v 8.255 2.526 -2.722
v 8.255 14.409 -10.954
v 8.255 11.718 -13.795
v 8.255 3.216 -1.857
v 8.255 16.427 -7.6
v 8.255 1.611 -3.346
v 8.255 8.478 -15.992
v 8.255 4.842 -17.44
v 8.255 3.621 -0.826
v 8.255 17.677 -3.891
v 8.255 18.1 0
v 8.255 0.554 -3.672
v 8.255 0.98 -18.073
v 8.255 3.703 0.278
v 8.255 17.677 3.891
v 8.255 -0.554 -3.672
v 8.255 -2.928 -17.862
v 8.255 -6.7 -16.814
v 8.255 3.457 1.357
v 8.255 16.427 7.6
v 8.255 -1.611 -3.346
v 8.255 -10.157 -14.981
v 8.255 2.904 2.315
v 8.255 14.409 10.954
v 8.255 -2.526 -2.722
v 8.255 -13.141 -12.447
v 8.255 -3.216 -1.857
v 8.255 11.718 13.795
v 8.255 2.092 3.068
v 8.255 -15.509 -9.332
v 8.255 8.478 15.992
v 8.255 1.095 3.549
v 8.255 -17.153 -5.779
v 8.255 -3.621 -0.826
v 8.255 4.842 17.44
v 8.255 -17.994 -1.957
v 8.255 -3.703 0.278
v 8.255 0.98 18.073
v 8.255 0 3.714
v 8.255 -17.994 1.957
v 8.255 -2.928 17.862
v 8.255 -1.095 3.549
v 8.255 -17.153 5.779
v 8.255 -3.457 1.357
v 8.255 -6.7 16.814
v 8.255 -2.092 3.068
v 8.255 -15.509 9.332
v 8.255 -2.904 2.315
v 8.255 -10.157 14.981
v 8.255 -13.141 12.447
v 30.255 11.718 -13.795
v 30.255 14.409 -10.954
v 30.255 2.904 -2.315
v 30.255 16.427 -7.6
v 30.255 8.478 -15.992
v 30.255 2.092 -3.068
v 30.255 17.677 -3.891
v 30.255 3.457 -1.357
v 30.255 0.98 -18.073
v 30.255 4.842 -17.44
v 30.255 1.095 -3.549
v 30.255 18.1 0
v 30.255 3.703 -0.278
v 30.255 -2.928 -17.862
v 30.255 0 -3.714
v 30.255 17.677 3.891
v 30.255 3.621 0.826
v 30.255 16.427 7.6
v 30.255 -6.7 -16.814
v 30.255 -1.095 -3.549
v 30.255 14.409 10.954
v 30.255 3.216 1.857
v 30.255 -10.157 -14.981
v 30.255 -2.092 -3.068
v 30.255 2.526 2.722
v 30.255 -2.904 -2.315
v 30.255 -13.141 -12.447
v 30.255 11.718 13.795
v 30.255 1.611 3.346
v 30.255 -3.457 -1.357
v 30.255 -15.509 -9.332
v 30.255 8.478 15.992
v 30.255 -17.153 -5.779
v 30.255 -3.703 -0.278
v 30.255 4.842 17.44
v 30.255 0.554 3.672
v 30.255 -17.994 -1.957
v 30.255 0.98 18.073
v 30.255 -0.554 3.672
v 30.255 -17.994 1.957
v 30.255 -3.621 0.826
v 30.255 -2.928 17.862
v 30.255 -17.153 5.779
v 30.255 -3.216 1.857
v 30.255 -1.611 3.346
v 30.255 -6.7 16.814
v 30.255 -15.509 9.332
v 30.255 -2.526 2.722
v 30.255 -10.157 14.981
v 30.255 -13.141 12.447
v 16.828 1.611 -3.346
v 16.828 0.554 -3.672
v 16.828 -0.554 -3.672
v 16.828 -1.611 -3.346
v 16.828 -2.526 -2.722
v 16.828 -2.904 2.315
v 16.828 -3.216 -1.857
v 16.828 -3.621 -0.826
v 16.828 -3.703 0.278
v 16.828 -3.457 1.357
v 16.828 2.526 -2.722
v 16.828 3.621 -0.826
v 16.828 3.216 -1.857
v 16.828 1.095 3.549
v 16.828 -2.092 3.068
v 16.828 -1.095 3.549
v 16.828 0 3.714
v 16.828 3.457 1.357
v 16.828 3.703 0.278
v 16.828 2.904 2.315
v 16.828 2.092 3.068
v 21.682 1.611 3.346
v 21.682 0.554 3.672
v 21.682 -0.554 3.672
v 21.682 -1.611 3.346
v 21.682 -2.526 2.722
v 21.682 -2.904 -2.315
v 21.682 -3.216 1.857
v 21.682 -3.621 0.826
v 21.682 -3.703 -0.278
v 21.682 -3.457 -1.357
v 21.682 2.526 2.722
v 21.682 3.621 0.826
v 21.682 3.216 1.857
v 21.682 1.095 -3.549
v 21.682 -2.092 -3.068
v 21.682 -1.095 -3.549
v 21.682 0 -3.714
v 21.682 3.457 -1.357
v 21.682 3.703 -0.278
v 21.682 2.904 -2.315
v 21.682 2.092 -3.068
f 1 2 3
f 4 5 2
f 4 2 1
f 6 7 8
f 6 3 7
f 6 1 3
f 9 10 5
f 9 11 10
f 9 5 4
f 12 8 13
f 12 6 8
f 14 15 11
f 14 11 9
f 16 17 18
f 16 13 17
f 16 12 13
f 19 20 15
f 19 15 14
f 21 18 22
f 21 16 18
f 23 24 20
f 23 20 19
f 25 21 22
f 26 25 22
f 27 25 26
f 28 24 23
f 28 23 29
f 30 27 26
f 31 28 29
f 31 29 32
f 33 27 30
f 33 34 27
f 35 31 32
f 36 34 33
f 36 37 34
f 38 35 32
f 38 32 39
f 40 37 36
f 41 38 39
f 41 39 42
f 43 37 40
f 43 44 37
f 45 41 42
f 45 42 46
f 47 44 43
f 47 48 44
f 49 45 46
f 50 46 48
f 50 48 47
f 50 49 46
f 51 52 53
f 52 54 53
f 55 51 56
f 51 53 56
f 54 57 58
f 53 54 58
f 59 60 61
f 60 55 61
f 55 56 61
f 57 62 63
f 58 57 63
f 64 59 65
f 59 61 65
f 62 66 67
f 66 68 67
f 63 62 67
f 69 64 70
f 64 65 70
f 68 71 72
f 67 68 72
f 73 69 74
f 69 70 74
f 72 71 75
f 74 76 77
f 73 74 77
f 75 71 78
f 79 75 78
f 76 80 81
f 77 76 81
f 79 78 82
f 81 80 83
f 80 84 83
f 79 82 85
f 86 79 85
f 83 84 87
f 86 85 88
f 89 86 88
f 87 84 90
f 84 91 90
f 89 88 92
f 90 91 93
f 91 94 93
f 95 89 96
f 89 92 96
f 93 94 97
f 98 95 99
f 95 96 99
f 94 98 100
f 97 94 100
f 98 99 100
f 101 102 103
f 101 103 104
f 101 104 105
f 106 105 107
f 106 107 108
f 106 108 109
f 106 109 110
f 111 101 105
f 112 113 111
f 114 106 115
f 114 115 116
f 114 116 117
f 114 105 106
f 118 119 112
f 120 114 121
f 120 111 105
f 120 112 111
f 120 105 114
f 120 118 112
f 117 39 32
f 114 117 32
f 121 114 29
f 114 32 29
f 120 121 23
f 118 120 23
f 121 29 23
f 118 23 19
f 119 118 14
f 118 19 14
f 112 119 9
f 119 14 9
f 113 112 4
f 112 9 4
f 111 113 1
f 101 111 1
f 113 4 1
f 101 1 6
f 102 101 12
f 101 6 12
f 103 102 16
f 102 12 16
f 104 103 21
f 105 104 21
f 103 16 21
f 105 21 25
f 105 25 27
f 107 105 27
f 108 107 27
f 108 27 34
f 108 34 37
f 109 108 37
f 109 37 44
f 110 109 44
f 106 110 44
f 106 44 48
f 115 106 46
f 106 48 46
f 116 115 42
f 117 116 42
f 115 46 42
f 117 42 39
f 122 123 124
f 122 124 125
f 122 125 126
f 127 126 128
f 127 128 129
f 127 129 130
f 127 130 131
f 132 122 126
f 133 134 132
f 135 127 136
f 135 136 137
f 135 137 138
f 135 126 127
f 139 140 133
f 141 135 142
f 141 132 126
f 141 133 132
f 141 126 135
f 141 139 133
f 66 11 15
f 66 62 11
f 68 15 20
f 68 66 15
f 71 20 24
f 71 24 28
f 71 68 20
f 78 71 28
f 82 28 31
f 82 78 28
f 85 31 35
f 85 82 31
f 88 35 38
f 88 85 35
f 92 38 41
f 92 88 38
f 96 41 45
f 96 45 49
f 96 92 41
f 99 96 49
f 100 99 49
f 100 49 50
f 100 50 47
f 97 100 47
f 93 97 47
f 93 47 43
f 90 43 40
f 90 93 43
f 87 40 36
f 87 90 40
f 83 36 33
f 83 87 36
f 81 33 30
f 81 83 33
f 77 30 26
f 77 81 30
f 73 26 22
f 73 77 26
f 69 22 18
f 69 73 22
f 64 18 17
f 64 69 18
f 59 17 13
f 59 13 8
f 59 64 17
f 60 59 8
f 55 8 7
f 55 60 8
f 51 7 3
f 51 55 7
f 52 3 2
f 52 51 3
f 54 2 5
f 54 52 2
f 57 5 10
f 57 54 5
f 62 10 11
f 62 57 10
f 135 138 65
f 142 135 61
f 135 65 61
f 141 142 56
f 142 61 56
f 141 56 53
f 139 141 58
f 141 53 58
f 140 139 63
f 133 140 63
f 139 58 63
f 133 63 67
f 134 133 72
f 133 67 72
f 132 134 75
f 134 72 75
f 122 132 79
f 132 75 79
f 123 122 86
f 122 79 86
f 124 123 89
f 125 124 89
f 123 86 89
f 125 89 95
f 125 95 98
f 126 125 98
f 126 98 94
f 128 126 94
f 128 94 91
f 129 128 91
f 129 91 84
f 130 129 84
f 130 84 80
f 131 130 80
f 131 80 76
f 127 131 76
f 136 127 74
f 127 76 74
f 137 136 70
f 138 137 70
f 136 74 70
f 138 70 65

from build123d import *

# Parameters (mm, degrees)
SKETCH1_W          = 22
SKETCH1_H          = 18.1
SKETCH2_R          = 3.71375
CUT_EXTRUDE1_DEPTH = 8.5725
SKETCH4_R          = 3.71375
CUT_EXTRUDE2_DEPTH = 8.5725


with BuildPart() as part:
    # Sketch1 → Revolve1 (revolve)
    with BuildSketch(Plane.XY):
        with Locations((19.255, 9.05)):
            Rectangle(SKETCH1_W, SKETCH1_H)
    revolve(axis=Axis((8.255, 0, 0), (1, 0, 0)))

    # Sketch2 → Cut-Extrude1 (cut)
    with BuildSketch(Plane.ZY.offset(-8.255)):
        Circle(SKETCH2_R)
    extrude(amount=-CUT_EXTRUDE1_DEPTH, mode=Mode.SUBTRACT)

    # Sketch4 → Cut-Extrude2 (cut)
    with BuildSketch(Plane(origin=(30.255, 0, 0), x_dir=(0, 0, -1), z_dir=(1, 0, 0))):
        Circle(SKETCH4_R)
    extrude(amount=-CUT_EXTRUDE2_DEPTH, mode=Mode.SUBTRACT)


solid = part.part
